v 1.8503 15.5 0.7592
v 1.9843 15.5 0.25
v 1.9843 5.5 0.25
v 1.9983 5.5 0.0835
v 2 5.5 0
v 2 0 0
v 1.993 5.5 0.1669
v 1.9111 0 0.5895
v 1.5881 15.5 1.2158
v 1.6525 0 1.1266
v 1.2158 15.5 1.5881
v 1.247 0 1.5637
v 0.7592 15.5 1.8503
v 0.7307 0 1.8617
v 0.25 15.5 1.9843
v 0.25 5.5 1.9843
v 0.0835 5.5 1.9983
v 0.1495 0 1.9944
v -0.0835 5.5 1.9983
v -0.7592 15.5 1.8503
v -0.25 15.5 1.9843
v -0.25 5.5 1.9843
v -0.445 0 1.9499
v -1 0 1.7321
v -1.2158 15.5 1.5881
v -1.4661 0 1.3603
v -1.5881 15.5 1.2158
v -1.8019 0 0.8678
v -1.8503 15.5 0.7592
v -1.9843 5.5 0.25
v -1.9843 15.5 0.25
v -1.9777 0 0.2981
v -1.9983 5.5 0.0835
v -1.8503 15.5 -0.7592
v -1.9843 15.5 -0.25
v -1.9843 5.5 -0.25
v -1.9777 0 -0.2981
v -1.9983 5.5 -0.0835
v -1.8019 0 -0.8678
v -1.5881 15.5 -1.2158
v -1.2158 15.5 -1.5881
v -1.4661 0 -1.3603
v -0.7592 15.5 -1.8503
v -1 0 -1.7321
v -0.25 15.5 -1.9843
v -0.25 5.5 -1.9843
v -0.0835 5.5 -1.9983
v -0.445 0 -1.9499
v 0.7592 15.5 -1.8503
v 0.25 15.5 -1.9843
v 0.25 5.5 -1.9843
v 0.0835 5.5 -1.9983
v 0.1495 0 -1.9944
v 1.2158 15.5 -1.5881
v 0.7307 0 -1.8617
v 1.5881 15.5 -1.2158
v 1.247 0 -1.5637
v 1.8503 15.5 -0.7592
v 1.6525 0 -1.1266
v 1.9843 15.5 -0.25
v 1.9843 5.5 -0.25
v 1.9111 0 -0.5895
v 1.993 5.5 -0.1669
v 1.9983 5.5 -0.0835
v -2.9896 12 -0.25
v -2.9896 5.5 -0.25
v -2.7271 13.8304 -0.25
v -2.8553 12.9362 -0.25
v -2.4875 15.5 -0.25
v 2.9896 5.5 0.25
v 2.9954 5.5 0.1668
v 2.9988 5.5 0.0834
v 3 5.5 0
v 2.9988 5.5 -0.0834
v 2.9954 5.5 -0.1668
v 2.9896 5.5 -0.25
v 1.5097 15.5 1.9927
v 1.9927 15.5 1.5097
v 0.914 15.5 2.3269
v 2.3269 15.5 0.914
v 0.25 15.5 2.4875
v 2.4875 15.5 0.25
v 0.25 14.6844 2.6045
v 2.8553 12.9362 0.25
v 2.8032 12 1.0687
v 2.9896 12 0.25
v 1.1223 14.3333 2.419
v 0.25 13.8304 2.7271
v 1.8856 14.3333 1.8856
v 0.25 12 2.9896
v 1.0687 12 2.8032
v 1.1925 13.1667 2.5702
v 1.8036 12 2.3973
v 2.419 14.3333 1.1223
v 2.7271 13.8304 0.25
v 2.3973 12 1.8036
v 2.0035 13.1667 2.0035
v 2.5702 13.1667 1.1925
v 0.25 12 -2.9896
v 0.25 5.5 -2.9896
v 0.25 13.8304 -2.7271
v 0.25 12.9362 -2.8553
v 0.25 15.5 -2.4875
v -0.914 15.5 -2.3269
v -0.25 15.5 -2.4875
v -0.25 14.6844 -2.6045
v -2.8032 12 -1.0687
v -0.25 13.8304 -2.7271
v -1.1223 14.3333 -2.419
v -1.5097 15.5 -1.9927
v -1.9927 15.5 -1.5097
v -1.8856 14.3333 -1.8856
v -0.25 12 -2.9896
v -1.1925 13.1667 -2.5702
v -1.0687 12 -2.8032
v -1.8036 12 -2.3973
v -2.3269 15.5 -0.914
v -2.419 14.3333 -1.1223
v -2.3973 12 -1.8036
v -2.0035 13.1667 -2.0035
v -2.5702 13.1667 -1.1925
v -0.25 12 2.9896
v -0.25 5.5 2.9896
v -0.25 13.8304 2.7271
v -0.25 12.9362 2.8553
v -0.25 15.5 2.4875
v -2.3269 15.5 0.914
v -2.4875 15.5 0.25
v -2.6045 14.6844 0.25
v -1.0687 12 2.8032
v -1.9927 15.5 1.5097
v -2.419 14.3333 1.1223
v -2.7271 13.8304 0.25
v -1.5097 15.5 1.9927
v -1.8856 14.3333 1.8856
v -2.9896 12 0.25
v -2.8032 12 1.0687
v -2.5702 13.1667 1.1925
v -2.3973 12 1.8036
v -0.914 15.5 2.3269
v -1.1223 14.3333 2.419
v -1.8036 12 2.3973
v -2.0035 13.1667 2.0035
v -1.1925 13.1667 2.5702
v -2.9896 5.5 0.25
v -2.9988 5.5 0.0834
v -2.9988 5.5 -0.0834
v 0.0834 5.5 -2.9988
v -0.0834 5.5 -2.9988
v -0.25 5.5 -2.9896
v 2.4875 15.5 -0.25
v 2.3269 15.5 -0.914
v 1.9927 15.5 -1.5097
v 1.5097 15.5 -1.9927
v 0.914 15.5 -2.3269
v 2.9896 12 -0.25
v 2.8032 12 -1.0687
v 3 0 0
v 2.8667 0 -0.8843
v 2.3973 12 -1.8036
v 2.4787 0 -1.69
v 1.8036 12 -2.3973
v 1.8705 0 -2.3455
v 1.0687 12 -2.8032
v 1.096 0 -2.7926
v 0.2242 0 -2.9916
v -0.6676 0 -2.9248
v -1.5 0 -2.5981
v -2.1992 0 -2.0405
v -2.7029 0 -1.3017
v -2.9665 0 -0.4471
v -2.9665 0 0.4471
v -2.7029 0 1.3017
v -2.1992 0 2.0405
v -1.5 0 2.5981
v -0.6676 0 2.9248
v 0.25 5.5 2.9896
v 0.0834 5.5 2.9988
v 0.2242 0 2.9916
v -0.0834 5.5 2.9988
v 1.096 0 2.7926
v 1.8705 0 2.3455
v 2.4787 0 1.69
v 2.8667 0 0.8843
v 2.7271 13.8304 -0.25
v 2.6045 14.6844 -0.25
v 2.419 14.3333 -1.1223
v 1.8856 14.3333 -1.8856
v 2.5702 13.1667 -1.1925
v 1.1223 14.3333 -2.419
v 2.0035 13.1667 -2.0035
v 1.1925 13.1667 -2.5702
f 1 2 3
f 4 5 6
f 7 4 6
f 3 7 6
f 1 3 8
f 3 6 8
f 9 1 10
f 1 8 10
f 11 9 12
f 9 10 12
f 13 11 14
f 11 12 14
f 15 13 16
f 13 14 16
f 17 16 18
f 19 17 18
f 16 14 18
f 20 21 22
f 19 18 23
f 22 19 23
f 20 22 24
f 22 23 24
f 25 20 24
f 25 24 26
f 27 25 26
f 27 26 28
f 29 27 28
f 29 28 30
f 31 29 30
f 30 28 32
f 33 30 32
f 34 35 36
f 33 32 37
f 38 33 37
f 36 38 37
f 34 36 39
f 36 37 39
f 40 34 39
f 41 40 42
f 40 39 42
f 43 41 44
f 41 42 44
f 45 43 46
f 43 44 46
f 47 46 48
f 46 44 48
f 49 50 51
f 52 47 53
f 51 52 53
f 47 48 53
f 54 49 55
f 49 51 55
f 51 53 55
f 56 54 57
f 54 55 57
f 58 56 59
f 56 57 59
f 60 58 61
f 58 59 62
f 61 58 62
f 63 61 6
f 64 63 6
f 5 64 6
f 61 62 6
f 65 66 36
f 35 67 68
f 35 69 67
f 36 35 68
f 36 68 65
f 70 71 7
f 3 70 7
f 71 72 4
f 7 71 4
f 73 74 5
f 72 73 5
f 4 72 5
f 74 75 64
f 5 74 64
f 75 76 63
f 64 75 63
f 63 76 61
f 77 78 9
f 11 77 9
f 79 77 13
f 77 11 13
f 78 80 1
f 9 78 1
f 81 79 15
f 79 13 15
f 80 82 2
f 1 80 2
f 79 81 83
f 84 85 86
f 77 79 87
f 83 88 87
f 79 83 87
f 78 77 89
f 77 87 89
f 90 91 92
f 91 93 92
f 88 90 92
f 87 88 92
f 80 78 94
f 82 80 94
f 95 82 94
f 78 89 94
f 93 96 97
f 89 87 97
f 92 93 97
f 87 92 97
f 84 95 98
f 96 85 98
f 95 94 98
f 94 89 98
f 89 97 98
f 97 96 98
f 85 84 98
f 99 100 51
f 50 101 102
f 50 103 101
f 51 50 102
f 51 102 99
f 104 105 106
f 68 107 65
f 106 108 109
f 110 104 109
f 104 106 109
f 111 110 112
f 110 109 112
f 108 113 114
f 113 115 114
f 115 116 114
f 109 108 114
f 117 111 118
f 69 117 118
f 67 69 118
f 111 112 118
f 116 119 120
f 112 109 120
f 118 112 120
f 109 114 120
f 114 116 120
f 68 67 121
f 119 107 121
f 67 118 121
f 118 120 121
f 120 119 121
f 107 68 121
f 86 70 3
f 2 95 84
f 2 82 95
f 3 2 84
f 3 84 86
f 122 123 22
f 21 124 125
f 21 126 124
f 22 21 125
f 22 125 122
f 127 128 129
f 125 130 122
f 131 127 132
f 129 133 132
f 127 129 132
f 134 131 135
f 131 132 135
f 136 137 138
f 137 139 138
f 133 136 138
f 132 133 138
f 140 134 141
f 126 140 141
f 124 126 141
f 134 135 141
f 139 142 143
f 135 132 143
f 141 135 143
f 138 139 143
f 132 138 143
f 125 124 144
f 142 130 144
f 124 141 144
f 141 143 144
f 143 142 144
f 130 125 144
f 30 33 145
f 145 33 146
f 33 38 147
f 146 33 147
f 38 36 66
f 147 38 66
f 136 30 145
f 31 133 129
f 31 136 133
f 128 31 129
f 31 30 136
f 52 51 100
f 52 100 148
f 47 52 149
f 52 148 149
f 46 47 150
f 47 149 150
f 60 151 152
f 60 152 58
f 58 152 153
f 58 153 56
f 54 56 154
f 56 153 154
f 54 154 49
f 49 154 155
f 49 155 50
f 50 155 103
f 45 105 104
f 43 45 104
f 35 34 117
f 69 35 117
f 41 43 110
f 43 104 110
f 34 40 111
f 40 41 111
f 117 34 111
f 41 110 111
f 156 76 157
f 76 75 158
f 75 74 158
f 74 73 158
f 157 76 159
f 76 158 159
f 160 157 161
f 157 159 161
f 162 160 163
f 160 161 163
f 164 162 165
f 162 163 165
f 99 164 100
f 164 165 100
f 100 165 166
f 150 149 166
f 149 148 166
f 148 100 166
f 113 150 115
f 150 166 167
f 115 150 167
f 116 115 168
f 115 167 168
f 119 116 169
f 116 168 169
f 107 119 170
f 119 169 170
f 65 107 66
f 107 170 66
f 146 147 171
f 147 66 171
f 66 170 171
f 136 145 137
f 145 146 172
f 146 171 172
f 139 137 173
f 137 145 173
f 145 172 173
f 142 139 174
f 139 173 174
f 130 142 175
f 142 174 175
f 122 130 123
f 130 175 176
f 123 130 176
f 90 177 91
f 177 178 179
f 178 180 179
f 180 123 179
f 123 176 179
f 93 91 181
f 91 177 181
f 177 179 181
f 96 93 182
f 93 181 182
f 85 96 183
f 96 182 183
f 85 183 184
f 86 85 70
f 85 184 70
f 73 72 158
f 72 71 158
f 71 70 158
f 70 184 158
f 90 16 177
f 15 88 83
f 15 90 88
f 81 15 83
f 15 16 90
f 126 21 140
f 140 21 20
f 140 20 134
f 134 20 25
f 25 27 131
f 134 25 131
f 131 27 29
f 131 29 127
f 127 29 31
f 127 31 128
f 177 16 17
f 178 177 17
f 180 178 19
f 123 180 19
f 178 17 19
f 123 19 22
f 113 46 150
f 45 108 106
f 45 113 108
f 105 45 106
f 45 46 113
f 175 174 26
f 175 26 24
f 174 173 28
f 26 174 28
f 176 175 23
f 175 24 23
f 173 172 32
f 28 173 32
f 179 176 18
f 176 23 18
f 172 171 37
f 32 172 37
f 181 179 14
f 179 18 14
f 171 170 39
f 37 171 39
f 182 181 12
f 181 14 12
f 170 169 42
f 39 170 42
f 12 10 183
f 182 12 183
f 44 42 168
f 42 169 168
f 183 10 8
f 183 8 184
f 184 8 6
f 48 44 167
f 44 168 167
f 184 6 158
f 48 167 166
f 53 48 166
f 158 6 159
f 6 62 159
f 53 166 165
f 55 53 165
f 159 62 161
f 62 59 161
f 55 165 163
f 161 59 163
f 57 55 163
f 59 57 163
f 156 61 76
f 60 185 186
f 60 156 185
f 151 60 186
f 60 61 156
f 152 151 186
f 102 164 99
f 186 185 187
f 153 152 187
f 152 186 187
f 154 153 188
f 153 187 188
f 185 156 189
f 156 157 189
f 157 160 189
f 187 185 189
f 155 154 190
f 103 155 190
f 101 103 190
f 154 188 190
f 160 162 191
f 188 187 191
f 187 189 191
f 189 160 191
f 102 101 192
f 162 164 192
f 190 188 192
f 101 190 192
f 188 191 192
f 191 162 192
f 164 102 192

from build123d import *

# Parameters (mm, degrees)
CUT_EXTRUDE_1_DEPTH = 10
SKETCH_3_R          = 2
CUT_EXTRUDE_2_DEPTH = 16.5


with BuildPart() as part:
    # Эскиз1 → Повернуть1 (revolve)
    with BuildSketch(Plane.XY):
        Polygon((0, 15.5), (2.5, 15.5), (3, 12), (3, 0), (0, 0), align=None)
    revolve(axis=Axis((0, 0, 0), (0, 1, 0)))

    # Эскиз2 → Вырез-Вытянуть1 (cut)
    with BuildSketch(Plane(origin=(0, 15.5, 0), x_dir=(1, 0, 0), z_dir=(0, 1, 0))):
        Polygon((-0.25, 6.25), (0.25, 6.25), (0.25, 0.25), (6.25, 0.25), (6.25, -0.25), (0.25, -0.25), (0.25, -6.25), (-0.25, -6.25), (-0.25, -0.25), (-6.25, -0.25), (-6.25, 0.25), (-0.25, 0.25), align=None)
    extrude(amount=-CUT_EXTRUDE_1_DEPTH, mode=Mode.SUBTRACT)

    # Эскиз3 → Вырез-Вытянуть2 (cut, through all)
    with BuildSketch(Plane.XZ):
        Circle(SKETCH_3_R)
    extrude(amount=-CUT_EXTRUDE_2_DEPTH, mode=Mode.SUBTRACT)


solid = part.part
